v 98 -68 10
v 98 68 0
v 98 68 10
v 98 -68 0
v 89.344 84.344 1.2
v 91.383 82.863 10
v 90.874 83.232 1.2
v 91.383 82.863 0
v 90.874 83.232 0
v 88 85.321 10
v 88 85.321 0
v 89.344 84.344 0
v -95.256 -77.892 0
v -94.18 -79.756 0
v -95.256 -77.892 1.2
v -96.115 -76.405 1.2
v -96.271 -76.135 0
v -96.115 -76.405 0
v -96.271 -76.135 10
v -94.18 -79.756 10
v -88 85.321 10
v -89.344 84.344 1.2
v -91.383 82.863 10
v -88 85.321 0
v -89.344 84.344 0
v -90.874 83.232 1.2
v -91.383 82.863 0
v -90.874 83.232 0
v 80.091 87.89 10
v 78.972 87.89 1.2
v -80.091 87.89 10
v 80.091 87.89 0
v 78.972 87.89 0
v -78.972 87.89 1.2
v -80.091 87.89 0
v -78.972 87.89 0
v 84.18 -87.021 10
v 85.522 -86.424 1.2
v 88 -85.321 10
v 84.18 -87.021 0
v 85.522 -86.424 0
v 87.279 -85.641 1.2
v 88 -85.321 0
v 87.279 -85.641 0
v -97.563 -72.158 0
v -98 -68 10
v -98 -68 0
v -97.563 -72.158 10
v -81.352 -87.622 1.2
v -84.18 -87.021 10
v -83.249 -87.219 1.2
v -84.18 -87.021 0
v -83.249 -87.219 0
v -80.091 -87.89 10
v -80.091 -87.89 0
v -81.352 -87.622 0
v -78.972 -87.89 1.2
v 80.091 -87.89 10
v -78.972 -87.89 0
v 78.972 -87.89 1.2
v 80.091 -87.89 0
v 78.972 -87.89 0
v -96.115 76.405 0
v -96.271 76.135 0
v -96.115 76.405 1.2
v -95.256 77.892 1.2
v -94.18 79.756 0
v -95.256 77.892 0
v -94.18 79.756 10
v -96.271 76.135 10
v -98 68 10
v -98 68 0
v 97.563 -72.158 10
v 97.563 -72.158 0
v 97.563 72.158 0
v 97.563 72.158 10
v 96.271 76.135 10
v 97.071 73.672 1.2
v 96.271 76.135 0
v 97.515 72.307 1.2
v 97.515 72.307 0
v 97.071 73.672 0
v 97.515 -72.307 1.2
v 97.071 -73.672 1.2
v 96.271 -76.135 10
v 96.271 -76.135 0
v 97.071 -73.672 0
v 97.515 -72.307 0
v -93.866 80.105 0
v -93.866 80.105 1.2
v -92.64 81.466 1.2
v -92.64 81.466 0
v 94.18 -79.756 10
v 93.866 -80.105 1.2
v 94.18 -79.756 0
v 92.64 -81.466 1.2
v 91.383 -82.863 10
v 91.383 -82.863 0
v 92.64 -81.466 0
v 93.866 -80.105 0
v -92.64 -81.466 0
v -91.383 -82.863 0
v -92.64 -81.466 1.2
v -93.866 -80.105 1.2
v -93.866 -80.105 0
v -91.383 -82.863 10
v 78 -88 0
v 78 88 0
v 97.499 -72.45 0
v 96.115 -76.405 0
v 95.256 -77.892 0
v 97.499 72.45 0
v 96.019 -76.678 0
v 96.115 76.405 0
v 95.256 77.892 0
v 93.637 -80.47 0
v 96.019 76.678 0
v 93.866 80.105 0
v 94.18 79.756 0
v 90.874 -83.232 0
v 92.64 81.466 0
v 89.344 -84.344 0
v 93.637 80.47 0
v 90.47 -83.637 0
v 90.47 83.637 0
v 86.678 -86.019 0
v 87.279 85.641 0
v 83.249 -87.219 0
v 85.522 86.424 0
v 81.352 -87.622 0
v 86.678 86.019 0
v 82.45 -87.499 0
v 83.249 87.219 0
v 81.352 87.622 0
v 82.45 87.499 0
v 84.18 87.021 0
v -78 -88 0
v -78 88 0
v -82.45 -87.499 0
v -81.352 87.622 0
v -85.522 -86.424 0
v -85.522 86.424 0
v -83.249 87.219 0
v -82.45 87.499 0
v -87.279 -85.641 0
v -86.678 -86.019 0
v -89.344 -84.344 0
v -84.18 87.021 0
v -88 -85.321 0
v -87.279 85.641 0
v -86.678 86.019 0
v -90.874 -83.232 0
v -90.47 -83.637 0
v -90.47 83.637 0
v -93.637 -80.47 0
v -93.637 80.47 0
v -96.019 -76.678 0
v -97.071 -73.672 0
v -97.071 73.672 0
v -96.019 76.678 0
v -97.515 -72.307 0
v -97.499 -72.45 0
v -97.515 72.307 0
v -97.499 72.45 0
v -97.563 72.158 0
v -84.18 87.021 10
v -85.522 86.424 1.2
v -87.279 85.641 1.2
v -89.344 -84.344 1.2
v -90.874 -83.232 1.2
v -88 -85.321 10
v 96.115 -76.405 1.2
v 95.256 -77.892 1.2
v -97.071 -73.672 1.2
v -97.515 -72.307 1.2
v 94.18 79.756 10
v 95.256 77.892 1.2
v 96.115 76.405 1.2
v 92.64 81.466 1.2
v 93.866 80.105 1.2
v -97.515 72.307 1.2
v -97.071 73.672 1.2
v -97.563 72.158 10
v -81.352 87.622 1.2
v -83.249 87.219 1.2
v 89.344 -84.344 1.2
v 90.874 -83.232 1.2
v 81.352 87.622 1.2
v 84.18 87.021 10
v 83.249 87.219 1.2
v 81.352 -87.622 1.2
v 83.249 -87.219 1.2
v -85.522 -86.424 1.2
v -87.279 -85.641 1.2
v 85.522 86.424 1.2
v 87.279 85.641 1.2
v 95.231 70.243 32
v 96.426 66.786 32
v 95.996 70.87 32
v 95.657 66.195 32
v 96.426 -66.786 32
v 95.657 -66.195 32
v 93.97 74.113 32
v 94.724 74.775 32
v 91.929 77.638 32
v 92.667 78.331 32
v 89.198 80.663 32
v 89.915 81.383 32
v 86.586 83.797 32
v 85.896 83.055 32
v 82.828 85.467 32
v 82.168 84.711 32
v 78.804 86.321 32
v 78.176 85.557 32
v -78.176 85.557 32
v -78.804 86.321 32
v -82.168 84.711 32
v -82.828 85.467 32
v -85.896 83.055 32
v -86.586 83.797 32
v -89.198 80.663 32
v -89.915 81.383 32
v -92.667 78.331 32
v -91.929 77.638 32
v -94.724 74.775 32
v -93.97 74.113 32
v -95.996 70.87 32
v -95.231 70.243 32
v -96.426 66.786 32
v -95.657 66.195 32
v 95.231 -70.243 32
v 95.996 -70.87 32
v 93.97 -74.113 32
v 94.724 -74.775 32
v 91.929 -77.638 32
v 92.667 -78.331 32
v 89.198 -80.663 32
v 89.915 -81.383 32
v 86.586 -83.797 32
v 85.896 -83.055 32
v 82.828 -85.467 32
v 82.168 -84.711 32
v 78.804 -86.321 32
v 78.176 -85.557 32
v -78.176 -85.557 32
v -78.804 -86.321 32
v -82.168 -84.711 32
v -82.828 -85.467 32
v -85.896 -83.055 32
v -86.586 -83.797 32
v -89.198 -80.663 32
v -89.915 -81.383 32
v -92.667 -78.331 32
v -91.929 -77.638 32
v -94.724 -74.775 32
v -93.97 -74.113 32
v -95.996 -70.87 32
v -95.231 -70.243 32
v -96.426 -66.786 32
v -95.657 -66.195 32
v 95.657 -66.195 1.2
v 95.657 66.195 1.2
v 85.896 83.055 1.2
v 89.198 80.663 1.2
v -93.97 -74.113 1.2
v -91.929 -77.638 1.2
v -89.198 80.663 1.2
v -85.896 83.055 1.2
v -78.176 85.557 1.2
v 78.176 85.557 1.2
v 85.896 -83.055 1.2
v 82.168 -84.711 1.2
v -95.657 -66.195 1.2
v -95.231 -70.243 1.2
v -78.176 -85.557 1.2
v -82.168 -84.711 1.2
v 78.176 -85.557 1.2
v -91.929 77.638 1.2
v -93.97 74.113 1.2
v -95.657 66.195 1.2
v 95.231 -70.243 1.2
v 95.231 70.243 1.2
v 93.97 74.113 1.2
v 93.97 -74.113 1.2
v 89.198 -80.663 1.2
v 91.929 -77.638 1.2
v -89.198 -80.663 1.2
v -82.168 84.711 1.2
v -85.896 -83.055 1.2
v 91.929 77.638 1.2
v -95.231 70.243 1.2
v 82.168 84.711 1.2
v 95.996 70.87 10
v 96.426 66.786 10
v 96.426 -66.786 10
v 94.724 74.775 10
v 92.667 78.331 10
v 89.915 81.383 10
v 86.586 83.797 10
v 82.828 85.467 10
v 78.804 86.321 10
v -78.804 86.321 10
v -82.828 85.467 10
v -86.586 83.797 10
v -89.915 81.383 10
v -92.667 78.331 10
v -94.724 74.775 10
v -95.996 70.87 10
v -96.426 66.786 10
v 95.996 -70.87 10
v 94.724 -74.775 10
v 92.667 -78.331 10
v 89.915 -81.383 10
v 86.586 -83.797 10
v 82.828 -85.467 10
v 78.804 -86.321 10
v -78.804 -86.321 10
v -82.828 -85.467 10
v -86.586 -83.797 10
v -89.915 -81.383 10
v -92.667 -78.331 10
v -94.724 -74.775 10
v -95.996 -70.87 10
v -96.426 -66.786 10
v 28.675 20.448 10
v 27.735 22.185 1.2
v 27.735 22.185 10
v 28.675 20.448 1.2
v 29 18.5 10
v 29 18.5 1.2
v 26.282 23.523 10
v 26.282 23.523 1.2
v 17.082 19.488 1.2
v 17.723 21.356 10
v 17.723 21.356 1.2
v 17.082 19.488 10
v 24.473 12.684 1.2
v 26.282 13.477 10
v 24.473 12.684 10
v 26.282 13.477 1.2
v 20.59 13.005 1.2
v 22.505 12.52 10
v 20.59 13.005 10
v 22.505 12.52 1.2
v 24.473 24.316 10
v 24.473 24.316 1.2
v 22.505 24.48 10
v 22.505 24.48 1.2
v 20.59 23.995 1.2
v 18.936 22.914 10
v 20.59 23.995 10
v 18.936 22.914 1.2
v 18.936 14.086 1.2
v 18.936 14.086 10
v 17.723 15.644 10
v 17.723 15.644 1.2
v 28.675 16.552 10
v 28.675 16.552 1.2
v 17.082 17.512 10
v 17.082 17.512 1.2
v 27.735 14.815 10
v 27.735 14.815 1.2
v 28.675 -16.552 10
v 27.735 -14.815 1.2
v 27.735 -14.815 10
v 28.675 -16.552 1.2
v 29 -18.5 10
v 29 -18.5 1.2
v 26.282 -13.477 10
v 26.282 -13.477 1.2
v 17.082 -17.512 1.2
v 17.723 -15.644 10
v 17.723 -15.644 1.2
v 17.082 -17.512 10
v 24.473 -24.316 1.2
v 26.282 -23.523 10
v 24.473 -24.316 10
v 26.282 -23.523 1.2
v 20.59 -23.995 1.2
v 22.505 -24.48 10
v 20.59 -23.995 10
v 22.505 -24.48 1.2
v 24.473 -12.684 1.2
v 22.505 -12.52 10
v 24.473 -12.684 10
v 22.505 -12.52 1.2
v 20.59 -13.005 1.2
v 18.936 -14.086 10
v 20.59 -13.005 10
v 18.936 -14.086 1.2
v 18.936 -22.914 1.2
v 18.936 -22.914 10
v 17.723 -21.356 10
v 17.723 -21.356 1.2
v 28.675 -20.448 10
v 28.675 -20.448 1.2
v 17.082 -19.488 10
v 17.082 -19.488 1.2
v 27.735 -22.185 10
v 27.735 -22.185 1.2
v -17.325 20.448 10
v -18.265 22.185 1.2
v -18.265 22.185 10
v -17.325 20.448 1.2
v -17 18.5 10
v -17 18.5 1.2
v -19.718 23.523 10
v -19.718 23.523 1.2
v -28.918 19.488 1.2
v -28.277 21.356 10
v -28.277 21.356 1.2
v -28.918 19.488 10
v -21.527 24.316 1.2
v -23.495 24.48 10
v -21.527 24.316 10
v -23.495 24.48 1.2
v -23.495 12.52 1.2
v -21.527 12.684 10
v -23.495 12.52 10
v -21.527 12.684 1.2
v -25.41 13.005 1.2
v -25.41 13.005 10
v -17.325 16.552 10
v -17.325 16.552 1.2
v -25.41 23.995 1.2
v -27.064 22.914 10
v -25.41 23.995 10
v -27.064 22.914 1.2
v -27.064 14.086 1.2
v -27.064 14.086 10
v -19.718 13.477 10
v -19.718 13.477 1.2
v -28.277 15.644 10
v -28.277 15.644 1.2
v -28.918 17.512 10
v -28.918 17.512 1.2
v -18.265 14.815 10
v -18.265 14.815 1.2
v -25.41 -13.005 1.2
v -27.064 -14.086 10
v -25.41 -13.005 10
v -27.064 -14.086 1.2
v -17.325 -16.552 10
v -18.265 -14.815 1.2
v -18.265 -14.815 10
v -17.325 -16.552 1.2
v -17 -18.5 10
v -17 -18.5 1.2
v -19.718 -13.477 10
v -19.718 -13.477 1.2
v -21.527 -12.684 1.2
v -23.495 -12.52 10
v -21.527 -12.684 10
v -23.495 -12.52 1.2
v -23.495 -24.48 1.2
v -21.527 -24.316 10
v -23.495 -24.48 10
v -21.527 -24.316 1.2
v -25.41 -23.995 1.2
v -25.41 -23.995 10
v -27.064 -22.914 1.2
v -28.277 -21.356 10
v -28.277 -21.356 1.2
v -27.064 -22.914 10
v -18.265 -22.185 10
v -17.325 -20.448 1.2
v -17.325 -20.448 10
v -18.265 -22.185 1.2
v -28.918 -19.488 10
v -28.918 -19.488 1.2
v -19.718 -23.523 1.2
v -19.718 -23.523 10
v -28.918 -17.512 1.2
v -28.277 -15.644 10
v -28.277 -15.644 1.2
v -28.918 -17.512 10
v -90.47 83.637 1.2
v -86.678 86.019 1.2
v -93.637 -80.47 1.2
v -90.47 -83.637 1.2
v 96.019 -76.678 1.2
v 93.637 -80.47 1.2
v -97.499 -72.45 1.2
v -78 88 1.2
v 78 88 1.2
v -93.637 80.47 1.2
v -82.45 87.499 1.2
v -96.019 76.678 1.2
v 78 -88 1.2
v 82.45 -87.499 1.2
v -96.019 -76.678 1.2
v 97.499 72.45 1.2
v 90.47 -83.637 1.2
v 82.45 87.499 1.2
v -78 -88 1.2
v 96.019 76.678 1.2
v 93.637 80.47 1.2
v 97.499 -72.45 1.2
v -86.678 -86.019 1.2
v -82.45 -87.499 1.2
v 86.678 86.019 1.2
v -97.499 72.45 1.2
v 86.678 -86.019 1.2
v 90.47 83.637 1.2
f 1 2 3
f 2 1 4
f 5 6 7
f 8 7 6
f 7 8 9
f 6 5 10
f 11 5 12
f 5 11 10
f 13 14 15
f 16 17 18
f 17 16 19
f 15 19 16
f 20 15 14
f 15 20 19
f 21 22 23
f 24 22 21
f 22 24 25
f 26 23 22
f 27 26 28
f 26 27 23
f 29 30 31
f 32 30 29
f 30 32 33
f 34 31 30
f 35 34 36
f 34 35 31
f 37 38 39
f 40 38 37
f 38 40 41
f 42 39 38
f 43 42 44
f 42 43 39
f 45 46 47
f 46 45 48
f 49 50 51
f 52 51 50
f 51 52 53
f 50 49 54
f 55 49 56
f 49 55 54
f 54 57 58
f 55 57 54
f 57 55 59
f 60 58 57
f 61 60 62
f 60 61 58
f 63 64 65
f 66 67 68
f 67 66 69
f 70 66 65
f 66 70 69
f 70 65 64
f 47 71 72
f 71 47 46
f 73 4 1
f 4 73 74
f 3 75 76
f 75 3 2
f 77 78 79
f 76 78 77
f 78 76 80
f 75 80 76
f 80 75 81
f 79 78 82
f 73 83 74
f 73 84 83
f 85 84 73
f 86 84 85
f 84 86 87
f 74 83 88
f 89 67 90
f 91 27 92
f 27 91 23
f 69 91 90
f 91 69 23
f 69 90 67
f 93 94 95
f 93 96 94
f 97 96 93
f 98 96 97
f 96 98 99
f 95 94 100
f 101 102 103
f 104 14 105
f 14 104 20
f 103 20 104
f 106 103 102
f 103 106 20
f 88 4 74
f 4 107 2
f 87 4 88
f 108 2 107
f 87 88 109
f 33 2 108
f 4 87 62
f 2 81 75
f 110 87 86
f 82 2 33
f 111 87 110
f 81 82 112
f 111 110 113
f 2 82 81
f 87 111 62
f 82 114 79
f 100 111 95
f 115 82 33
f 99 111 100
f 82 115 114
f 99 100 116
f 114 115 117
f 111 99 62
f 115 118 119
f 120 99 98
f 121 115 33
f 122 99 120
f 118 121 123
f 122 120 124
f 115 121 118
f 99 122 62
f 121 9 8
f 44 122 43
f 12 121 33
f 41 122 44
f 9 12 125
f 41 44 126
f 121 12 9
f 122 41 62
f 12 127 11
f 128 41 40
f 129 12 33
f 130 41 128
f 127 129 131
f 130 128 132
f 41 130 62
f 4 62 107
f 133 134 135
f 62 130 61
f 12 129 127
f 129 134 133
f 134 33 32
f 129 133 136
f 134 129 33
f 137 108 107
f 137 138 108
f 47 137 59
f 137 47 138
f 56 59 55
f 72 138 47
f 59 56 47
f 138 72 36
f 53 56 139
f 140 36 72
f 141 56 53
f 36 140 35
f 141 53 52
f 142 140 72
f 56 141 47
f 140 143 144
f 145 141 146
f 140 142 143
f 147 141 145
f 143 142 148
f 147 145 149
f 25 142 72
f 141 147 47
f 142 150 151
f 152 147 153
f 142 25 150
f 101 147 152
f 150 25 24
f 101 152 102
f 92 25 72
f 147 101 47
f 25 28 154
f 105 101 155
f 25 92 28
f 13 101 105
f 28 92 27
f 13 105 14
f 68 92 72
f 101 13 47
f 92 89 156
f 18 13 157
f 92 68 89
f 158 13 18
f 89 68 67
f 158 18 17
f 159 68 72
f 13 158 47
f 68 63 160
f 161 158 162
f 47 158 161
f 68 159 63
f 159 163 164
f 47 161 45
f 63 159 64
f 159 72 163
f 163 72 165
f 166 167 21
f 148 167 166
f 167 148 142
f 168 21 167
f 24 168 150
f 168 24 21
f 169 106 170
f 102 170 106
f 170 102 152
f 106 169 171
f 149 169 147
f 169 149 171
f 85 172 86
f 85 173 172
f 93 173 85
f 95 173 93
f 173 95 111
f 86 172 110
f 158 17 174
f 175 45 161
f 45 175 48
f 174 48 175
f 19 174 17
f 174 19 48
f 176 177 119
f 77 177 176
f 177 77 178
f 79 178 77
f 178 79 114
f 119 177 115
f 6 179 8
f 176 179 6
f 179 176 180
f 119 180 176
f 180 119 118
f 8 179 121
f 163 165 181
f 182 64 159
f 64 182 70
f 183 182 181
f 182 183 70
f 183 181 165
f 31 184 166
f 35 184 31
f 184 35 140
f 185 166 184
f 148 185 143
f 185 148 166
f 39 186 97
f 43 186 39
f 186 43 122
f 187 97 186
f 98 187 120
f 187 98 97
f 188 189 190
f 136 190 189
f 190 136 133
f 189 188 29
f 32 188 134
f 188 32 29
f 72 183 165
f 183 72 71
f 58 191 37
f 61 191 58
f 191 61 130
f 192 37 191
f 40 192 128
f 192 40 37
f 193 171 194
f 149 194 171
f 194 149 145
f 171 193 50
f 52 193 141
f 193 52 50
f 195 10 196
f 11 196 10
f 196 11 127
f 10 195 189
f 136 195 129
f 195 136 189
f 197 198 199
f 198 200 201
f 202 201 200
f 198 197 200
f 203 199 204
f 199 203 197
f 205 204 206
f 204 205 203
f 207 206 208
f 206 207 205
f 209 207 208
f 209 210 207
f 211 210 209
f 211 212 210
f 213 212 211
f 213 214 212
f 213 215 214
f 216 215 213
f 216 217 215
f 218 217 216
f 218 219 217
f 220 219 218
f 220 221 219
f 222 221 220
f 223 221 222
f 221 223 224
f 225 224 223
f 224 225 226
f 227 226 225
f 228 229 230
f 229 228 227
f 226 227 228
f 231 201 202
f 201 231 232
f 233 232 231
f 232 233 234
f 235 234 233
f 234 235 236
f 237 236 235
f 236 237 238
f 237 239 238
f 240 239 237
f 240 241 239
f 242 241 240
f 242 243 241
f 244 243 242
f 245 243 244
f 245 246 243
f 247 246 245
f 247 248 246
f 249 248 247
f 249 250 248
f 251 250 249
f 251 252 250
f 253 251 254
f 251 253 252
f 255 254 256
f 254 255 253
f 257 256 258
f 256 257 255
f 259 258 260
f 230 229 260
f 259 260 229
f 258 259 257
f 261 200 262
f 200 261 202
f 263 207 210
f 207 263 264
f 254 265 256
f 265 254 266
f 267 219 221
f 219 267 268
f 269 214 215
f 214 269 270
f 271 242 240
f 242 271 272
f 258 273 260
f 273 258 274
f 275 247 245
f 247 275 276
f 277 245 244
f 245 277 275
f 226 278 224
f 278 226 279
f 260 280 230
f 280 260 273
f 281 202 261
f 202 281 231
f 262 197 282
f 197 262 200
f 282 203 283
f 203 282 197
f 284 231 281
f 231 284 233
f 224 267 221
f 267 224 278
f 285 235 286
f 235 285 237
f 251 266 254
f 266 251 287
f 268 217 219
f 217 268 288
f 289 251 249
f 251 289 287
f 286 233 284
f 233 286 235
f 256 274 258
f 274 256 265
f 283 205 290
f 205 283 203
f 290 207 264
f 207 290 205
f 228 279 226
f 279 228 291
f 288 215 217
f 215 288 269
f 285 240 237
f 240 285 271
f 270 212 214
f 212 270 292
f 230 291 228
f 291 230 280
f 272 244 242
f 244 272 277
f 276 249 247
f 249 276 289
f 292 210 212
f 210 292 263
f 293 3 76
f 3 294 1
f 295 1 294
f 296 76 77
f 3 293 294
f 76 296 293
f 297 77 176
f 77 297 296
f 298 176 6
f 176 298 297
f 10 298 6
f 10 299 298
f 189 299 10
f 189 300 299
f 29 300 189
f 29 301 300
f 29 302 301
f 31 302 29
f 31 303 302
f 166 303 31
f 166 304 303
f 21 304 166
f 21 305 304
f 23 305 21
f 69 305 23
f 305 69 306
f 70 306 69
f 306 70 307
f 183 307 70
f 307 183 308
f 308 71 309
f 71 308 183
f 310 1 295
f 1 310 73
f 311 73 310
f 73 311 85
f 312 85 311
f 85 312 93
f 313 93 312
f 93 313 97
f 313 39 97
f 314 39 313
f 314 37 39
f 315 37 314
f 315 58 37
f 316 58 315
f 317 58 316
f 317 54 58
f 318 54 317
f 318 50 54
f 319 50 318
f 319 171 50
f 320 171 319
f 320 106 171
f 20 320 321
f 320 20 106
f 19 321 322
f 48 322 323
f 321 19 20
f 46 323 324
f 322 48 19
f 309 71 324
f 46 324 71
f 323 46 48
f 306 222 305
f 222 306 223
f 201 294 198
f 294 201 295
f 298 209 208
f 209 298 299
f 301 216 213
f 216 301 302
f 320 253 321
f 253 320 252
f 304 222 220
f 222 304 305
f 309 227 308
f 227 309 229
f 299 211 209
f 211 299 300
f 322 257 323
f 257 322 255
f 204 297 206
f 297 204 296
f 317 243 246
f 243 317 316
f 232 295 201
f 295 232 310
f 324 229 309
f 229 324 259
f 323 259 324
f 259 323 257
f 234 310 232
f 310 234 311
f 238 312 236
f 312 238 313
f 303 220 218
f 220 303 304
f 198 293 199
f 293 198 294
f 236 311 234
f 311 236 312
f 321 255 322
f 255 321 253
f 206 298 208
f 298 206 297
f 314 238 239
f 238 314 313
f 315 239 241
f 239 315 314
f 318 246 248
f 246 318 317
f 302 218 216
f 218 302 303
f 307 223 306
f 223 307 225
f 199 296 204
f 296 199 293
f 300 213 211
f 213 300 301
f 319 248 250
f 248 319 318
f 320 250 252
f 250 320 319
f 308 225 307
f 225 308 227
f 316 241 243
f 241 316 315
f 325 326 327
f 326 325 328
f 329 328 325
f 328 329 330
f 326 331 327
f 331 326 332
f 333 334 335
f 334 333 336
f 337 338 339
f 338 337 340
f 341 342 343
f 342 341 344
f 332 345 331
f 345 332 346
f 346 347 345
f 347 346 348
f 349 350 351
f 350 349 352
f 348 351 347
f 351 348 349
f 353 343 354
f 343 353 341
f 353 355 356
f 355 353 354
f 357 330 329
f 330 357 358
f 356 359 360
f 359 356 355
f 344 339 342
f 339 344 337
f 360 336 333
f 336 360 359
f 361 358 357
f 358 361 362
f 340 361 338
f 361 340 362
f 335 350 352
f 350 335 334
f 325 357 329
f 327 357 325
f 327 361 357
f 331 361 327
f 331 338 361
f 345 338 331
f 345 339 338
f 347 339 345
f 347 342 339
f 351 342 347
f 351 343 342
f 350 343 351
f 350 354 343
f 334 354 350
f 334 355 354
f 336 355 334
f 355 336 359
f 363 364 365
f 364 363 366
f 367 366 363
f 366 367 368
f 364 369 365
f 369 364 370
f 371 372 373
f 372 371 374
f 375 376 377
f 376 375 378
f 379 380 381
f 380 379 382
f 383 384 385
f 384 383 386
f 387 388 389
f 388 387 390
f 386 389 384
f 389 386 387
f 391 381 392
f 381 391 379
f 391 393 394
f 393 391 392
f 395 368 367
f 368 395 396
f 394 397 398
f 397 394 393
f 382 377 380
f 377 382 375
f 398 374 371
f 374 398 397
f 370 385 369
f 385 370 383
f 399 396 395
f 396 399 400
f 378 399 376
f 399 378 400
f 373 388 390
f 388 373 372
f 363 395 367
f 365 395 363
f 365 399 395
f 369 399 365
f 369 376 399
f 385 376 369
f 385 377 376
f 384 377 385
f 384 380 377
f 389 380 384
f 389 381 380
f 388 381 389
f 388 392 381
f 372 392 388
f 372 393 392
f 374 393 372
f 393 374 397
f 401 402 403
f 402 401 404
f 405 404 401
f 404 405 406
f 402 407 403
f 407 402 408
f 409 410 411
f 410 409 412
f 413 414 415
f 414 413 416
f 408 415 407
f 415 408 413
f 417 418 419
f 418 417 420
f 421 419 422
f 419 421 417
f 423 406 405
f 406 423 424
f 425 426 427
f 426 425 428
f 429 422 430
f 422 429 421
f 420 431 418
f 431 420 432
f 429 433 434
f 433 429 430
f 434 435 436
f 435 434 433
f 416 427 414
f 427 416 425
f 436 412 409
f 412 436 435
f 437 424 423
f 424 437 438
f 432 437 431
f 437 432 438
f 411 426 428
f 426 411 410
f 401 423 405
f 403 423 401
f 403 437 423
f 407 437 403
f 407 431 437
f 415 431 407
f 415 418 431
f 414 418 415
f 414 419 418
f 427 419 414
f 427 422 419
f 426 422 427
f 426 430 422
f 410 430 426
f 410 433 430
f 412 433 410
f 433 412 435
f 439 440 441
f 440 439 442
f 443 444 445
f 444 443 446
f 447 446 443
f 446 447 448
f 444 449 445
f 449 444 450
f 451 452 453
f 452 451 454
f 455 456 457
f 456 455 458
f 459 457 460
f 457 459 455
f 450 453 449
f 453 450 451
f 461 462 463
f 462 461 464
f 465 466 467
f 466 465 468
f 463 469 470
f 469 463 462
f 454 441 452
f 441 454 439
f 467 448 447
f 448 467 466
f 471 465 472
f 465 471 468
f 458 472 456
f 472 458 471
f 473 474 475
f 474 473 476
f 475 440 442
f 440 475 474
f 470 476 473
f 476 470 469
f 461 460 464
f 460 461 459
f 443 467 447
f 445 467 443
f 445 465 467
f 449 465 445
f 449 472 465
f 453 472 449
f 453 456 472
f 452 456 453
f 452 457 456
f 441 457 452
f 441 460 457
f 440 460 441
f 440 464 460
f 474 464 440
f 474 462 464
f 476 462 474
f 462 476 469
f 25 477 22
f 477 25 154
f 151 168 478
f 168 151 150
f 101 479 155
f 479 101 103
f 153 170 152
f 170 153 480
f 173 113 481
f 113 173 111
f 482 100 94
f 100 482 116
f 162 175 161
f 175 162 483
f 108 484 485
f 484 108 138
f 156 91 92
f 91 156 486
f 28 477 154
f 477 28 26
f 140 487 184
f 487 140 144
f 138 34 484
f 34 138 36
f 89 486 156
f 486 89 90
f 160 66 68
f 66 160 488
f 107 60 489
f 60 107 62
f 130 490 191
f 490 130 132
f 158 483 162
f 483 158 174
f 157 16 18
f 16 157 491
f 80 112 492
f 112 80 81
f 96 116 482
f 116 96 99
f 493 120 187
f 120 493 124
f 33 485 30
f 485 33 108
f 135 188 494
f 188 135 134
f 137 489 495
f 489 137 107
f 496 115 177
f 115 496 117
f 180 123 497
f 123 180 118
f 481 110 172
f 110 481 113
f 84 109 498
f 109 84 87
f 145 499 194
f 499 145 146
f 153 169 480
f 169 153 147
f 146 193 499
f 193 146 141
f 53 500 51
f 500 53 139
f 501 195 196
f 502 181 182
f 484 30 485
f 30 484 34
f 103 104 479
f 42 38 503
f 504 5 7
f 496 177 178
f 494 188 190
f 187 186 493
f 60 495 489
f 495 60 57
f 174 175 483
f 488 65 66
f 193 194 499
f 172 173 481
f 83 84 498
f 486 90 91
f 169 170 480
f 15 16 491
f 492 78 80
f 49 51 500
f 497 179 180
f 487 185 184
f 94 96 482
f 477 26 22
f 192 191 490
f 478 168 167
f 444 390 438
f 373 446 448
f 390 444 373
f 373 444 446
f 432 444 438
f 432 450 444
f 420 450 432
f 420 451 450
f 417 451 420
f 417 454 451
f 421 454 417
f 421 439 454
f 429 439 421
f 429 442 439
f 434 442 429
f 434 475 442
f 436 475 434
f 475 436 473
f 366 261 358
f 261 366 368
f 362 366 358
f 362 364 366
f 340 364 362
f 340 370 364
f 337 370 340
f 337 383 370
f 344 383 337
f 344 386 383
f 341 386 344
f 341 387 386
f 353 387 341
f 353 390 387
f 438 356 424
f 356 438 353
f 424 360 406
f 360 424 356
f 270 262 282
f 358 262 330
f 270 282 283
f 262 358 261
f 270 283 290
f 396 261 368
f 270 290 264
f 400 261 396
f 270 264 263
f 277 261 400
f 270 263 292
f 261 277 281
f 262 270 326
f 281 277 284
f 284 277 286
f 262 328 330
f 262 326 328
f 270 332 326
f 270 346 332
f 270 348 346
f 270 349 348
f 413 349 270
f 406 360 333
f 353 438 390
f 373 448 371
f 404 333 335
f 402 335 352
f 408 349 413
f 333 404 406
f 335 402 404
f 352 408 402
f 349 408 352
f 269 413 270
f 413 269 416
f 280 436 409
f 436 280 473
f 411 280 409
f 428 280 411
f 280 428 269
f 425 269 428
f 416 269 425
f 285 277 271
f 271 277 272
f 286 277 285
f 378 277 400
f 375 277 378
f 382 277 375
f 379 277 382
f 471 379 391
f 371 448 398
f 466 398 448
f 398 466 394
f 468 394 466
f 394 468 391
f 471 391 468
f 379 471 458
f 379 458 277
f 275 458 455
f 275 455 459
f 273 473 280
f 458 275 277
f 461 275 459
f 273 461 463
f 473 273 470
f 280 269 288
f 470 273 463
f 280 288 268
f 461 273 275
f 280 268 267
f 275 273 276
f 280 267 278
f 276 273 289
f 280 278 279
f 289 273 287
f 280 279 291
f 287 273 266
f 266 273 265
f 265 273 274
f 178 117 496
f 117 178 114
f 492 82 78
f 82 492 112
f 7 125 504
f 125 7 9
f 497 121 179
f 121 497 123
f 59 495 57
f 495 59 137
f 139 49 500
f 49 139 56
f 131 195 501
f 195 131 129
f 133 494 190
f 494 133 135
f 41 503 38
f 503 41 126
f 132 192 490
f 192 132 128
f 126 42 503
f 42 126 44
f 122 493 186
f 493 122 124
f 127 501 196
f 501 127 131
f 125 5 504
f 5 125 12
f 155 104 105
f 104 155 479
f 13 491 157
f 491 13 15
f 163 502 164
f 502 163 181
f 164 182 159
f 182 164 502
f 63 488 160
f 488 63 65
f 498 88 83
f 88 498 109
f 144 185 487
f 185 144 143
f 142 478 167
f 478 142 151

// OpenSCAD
bot_h = 25;

core_w = 32;
height = 32;
props_r = 38;
space_x = 130 - 10;
space_y = 90 + 10;

corner_r = 20;
corner_a = 90;

thickness = 1.2;

total_width = props_r * 2 + space_x;
total_height = props_r * 2 + space_y;

echo("total_width: ", total_width);
echo("total_height: ", total_height);

module box() {
  translate([-space_x / 2, -space_y / 2, 0]) {
    hull() {
      translate([0, 0, 0]) {
        cylinder(h = height, r = props_r);
        translate([-props_r + corner_r, -props_r + corner_r, 0]) {
          cylinder(h = height, r = corner_r);
        }
      }
      translate([space_x, 0, 0]) {
        cylinder(h = height, r = props_r);
        translate([props_r - corner_r, -props_r + corner_r, 0]) {
          cylinder(h = height, r = corner_r);
        }
      }
      translate([0, space_y, 0]) {
        cylinder(h = height, r = props_r);
        translate([-props_r + corner_r, props_r - corner_r, 0]) {
          cylinder(h = height, r = corner_r);
        }
      }
      translate([space_x, space_y, 0]) {
        cylinder(h = height, r = props_r);
        translate([props_r - corner_r, props_r - corner_r, 0]) {
          cylinder(h = height, r = corner_r);
        }
      }
    }
  }
}

module open_box(t = 1) {
  x_factor = (total_width * 100) / (total_width + t * 2) / 100;
  y_factor = (total_height * 100) / (total_height + t * 2) / 100;

  echo("x_factor: ", x_factor);
  echo("y_factor: ", y_factor);

  difference() {
    box();
    scale([x_factor, y_factor, 1]) {
      box();
    }
  }
}

module pieEdge(a, r, h, rot = 0) {
  difference() {
    pieSlice(a, r, h, rot);
    cylinder(h = h, r = r - 1);
  }
}

module pieSlice(a, r, h, rot = 0) {
  // a:angle, r:radius, h:height
  rotate(rot, [0, 0, 1]) {
    rotate_extrude(angle = a) {
      square([r, h]);
    }
  }
}

module core() {
  core_lock_r = 7;
  core_lock_h = 10;
  enforcer_shift = 20;
  core_lock2_r = 3;

  translate([-core_w / 2, -total_height / 2 + thickness, 0]) {
    cube([core_w, total_height - thickness - 55, thickness]);
  }

  module backtocenter() {
    translate([space_x / 2, space_y / 2, 0]) {
      cylinder(h = thickness, r = 5);
    }
  }
  cylinder(h = thickness, r = core_w / 2);
  cylinder(h = core_lock_h, r = core_lock_r);
  translate([0, 24, 0]) {
    cylinder(h = core_lock_h, r = core_lock2_r);
  }
  translate([0, -24, 0]) {
    cylinder(h = core_lock_h, r = core_lock2_r);
  }
  translate([-space_x / 2, -space_y / 2, 0]) {
    hull() {
      translate([0, -enforcer_shift, 0]) {
        backtocenter();
      }
      translate([space_x, 0, 0]) {
        translate([props_r - corner_r, -props_r + corner_r, 0]) {
          pieEdge(a = corner_a, rot = 270 + (90 - corner_a) / 2, h = thickness, r = corner_r);
        }
      }
      // }
      // hull() {
      translate([0, -enforcer_shift, 0]) {
        backtocenter();
      }
      translate([0, 0, 0]) {
        translate([-props_r + corner_r, -props_r + corner_r, 0]) {
          pieEdge(a = corner_a, rot = 180 + (90 - corner_a) / 2, h = thickness, r = corner_r);
        }
      }
      // }
      // hull() {
      translate([0, enforcer_shift, 0]) {
        backtocenter();
      }
      translate([0, space_y, 0]) {
        translate([-props_r + corner_r, props_r - corner_r, 0]) {
          pieEdge(a = corner_a, rot = 90 + (90 - corner_a) / 2, h = thickness, r = corner_r);
        }
      }
      // }
      // hull() {
      translate([0, enforcer_shift, 0]) {
        backtocenter();
      }
      translate([space_x, space_y, 0]) {
        translate([props_r - corner_r, props_r - corner_r, 0]) {
          pieEdge(a = corner_a, rot = 0 + (90 - corner_a) / 2, h = thickness, r = corner_r);
        }
      }
    }
  }
}

module core_bot() {
  core_lock_r = 6;
  core_lock_h = 10;
  shift1 = 46 / 2;
  shift2 = 37 / 2;

  shift_y = 0;

  translate([0, shift_y, 0]) {
    translate([shift1, shift2, 0]) {
      cylinder(h = core_lock_h, r = core_lock_r);
    }
    translate([shift1, -shift2, 0]) {
      cylinder(h = core_lock_h, r = core_lock_r);
    }
    translate([-shift1, shift2, 0]) {
      cylinder(h = core_lock_h, r = core_lock_r);
    }
    translate([-shift1, -shift2, 0]) {
      cylinder(h = core_lock_h, r = core_lock_r);
    }
  }

  // REAL BOTTOM
  translate([-space_x / 2, -space_y / 2, 0]) {
    hull() {
      translate([space_x, 0, 0]) {
        translate([props_r - corner_r, -props_r + corner_r, 0]) {
          pieEdge(a = corner_a, rot = 270 + (90 - corner_a) / 2, h = thickness, r = corner_r);
        }
      }
      translate([0, 0, 0]) {
        translate([-props_r + corner_r, -props_r + corner_r, 0]) {
          pieEdge(a = corner_a, rot = 180 + (90 - corner_a) / 2, h = thickness, r = corner_r);
        }
      }
      translate([0, space_y, 0]) {
        translate([-props_r + corner_r, props_r - corner_r, 0]) {
          pieEdge(a = corner_a, rot = 90 + (90 - corner_a) / 2, h = thickness, r = corner_r);
        }
      }
      translate([space_x, space_y, 0]) {
        translate([props_r - corner_r, props_r - corner_r, 0]) {
          pieEdge(a = corner_a, rot = 0 + (90 - corner_a) / 2, h = thickness, r = corner_r);
        }
      }
    }
  }
}

module box_bot() {
  bot_t = thickness + 1.2;
  difference() {
    open_box(bot_t);
    translate([0, 0, 10]) {
      open_box(thickness + 0.4);
    }
  }
}

render() {
  box_bot();
  core_bot();
}

// Top
// render() {
//   core();
//   open_box(thickness);
// }
